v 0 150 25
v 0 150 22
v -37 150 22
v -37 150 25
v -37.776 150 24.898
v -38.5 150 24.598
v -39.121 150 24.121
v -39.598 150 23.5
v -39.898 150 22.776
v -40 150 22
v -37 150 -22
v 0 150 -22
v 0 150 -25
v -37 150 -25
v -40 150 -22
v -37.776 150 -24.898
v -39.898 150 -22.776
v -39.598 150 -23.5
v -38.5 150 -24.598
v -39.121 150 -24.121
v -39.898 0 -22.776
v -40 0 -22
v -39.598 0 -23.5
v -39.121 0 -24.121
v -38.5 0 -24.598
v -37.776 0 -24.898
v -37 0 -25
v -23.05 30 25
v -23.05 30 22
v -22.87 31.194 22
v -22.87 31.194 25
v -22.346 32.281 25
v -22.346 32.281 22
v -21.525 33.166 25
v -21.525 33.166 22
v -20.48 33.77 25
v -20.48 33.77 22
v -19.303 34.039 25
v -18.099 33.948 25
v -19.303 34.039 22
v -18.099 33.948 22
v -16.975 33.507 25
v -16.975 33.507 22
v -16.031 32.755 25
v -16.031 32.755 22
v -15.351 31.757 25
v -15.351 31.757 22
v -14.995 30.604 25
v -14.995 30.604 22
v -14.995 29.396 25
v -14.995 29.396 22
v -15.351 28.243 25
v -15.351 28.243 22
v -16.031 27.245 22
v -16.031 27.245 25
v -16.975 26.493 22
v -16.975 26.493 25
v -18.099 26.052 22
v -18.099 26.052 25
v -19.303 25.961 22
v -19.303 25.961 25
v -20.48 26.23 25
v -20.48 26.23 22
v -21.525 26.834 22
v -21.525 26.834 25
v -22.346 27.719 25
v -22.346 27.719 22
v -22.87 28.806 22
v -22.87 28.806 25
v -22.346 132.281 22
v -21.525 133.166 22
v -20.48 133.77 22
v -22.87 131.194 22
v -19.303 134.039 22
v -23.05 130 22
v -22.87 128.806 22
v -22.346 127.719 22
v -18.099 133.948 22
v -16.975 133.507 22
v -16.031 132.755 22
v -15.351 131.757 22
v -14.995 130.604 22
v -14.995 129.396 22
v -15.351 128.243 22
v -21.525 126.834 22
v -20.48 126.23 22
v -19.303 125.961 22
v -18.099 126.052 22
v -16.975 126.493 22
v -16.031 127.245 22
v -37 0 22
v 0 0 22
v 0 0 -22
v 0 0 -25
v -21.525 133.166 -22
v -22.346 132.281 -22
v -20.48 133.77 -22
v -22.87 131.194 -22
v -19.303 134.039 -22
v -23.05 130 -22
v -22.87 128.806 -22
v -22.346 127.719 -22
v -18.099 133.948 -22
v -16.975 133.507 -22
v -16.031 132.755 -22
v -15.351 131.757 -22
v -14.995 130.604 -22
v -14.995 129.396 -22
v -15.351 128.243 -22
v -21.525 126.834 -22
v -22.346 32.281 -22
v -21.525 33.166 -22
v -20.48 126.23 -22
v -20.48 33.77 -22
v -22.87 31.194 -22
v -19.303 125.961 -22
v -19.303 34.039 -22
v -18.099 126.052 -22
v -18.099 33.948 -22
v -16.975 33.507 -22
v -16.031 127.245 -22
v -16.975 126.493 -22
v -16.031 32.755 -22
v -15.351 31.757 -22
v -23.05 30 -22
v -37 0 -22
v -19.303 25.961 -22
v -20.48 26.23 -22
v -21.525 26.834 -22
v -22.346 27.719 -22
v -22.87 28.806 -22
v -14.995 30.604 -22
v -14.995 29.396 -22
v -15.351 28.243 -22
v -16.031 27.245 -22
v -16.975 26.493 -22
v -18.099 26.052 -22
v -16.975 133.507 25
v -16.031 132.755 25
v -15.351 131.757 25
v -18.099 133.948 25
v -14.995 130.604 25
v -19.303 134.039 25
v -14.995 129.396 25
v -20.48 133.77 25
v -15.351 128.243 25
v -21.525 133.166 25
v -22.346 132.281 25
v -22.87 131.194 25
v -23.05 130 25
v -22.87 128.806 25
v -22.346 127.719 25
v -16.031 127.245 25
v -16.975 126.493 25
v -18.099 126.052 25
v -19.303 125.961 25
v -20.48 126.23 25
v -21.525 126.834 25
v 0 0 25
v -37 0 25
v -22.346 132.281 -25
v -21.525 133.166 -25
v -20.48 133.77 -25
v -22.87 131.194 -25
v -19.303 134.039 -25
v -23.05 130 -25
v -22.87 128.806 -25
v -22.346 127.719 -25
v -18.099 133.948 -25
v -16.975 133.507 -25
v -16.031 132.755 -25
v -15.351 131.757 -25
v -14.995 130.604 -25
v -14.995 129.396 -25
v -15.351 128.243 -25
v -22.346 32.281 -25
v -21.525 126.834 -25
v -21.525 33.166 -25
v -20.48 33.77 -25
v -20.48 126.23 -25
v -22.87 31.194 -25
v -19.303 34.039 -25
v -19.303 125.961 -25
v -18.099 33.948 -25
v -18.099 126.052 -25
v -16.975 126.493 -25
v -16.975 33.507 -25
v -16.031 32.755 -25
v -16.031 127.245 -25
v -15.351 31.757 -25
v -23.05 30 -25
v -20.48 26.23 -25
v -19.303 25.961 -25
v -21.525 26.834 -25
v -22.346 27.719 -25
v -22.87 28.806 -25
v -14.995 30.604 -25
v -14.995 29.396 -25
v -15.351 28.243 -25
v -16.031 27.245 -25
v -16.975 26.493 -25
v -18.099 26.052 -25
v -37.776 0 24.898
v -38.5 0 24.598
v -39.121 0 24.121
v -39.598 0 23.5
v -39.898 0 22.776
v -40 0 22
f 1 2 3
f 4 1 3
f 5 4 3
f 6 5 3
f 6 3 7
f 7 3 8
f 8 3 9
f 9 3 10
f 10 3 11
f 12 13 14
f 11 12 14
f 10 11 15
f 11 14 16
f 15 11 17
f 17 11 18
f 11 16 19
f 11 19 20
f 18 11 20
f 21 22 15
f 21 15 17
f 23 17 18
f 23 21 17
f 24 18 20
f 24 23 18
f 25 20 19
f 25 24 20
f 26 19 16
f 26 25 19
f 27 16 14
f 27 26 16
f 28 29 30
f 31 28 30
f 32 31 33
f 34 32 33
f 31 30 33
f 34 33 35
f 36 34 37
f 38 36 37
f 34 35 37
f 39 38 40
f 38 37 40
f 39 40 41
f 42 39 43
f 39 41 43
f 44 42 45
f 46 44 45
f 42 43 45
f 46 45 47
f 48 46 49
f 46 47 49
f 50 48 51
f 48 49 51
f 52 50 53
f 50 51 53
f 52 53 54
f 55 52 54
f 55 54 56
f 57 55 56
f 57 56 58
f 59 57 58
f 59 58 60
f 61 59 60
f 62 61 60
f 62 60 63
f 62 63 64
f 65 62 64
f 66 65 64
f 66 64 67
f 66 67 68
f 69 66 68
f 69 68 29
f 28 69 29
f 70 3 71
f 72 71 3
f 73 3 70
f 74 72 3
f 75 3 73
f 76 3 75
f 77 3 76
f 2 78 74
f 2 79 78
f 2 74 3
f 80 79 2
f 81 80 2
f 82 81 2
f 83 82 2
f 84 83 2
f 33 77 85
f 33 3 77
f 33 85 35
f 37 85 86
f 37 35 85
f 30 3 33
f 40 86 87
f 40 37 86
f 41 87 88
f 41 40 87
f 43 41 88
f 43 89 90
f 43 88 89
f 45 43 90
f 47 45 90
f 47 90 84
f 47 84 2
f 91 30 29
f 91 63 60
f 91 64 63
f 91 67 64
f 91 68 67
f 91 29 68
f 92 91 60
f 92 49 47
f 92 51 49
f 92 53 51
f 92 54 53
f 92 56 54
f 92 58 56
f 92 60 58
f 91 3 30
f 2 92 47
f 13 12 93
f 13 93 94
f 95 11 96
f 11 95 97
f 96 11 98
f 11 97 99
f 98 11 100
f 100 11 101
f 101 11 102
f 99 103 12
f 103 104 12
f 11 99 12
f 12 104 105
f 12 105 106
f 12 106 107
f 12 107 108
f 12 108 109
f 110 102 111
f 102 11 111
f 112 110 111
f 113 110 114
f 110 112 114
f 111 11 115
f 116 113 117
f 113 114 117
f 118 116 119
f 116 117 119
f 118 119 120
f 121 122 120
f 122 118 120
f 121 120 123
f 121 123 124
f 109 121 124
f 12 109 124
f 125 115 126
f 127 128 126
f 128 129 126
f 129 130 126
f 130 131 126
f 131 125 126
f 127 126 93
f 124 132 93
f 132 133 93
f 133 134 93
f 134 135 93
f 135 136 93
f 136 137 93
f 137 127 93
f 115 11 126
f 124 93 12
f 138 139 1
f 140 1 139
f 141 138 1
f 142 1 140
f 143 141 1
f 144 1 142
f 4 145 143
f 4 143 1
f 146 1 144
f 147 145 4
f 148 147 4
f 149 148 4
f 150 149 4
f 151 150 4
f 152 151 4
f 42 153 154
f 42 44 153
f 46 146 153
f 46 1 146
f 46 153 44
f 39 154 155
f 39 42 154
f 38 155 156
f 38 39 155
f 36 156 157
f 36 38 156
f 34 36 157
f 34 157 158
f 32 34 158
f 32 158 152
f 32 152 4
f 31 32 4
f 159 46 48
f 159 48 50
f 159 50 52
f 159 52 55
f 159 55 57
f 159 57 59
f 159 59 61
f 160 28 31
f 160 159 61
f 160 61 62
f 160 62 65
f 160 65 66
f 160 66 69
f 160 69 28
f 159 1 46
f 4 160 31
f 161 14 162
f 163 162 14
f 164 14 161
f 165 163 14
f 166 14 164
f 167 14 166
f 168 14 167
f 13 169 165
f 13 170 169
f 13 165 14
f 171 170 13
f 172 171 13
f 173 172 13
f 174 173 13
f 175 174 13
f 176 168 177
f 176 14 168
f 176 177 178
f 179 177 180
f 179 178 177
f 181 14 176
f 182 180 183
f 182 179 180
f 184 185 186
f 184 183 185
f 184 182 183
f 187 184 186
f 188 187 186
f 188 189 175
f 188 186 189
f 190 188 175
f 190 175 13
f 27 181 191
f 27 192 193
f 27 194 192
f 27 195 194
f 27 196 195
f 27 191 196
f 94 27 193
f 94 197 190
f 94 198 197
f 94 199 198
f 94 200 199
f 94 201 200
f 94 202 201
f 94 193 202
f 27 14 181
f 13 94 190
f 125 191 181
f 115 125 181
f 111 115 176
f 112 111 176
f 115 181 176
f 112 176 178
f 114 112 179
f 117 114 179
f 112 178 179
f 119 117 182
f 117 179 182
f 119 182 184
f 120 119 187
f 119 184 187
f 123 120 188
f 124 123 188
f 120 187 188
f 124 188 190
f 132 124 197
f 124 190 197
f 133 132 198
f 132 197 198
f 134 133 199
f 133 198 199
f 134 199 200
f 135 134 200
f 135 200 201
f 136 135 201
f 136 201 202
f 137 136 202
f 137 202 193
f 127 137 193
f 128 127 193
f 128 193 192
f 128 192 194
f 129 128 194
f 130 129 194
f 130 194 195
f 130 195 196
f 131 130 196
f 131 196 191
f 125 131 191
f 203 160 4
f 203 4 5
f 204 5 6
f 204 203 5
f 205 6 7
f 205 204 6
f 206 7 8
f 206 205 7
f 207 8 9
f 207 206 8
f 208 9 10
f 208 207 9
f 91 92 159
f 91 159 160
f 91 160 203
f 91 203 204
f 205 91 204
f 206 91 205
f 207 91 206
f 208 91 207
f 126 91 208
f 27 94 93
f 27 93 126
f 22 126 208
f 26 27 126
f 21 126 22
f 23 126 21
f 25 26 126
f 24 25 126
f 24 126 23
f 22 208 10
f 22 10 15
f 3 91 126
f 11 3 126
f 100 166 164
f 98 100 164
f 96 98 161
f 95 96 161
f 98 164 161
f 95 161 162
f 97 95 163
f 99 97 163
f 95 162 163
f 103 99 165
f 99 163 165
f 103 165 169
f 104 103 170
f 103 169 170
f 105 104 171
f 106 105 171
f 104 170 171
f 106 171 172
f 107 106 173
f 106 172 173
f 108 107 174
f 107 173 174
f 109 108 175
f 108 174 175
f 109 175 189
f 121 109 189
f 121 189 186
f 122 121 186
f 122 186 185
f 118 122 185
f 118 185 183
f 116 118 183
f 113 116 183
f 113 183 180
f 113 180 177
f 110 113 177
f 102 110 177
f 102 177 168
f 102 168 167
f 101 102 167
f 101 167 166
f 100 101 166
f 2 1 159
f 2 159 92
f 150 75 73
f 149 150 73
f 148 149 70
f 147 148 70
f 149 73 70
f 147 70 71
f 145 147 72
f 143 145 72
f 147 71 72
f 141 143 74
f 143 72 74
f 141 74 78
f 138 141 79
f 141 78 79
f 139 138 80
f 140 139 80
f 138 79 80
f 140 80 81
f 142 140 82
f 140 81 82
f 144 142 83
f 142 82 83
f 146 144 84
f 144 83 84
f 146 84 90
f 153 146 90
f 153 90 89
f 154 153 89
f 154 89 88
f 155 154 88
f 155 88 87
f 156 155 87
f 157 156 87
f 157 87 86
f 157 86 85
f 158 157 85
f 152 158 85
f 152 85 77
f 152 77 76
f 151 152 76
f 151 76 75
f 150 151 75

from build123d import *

# Parameters (mm, degrees)
SKETCH_1_W          = 74
SKETCH_1_H          = 44
EXTRUDE_1_DEPTH     = 150
SKETCH_2_W          = 41.146480438
SKETCH_2_H          = 58.393385187
CUT_EXTRUDE_1_DEPTH = 151
SKETCH_3_R          = 4.05
CUT_EXTRUDE_2_DEPTH = 51


with BuildPart() as part:
    # Эскиз1 → Вытянуть-Тонкостенный1 (new body)
    with BuildSketch(Plane(origin=(0, 0, 0), x_dir=(1, 0, 0), z_dir=(0, 1, 0))):
        with BuildLine():
            Line((40, 22), (40, -22))
            ThreePointArc((40, -22), (39.121320344, -24.121320344), (37, -25))
            Line((37, -25), (-37, -25))
            ThreePointArc((-37, -25), (-39.121320344, -24.121320344), (-40, -22))
            Line((-40, -22), (-40, 22))
            ThreePointArc((-40, 22), (-39.121320344, 24.121320344), (-37, 25))
            Line((-37, 25), (37, 25))
            ThreePointArc((37, 25), (39.121320344, 24.121320344), (40, 22))
        make_face()
        Rectangle(SKETCH_1_W, SKETCH_1_H, mode=Mode.SUBTRACT)
    extrude(amount=EXTRUDE_1_DEPTH)

    # Эскиз2 → Вырез-Вытянуть1 (cut, through all)
    with BuildSketch(Plane(origin=(0, 150, 0), x_dir=(1, 0, 0), z_dir=(0, 1, 0))):
        with Locations((20.573240219, 1.776081122)):
            Rectangle(SKETCH_2_W, SKETCH_2_H)
    extrude(amount=-CUT_EXTRUDE_1_DEPTH, mode=Mode.SUBTRACT)

    # Эскиз3 → Вырез-Вытянуть2 (cut, through all)
    with BuildSketch(Plane(origin=(0, 0, -25), x_dir=(-1, 0, 0), z_dir=(0, 0, -1))):
        with Locations((19, 130)):
            Circle(SKETCH_3_R)
        with Locations((19, 30)):
            Circle(SKETCH_3_R)
    extrude(amount=-CUT_EXTRUDE_2_DEPTH, mode=Mode.SUBTRACT)


solid = part.part
